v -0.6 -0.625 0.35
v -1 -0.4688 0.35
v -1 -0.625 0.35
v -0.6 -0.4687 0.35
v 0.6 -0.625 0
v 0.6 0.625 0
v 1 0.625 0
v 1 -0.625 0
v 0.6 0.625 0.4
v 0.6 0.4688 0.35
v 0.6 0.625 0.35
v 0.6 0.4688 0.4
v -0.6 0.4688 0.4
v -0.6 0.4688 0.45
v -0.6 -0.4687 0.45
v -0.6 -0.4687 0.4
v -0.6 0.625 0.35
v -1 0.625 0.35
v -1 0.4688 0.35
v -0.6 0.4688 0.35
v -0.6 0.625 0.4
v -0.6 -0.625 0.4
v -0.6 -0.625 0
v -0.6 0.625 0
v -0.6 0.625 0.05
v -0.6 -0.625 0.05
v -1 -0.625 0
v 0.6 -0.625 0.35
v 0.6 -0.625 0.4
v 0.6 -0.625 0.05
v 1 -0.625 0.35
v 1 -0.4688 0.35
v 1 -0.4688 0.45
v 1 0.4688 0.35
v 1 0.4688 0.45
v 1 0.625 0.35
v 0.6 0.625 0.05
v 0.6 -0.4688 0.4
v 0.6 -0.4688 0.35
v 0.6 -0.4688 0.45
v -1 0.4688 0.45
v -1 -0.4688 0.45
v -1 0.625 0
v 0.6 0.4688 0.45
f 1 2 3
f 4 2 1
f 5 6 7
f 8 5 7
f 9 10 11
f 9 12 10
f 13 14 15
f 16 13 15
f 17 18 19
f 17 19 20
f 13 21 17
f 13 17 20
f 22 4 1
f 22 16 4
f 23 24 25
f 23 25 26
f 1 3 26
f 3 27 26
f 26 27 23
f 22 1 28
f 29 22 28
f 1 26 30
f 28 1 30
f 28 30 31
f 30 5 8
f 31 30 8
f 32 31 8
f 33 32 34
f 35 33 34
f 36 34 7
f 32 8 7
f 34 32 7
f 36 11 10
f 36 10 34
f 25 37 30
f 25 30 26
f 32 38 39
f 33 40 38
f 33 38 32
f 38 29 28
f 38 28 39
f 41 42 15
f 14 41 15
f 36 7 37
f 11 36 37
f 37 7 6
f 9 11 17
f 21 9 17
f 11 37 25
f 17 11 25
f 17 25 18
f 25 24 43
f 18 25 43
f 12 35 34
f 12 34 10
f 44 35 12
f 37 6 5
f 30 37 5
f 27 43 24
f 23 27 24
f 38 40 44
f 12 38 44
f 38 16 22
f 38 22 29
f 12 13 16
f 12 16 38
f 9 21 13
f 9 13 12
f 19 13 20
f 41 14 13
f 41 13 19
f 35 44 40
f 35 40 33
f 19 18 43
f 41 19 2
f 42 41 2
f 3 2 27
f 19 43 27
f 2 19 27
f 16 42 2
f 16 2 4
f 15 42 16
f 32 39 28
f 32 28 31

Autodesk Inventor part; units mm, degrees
ref_plane "YZ Plane" through (0, 0, 0) normal (1, 0, 0) x (0, 1, 0)
ref_plane "XZ Plane" through (0, 0, 0) normal (0, 1, 0) x (-1, 0, 0)
ref_plane "XY Plane" through (0, 0, 0) normal (0, 0, 1) x (1, 0, 0)
sketch "Sketch1" plane through (0, 0, 0) normal (0, 0, 1) x (1, 0, 0)
  line L0 (-1, -0.625) -> (1, -0.625)
  line L1 (1, -0.625) -> (1, 0.625)
  line L2 (1, 0.625) -> (-1, 0.625)
  line L3 (-1, 0.625) -> (-1, -0.625)
  line L4 (-1, -0.625) -> (1, 0.625) construction
  line L5 (1, -0.625) -> (-1, 0.625) construction
  point P0 (0, 0)
  dimension "d0" = 2
  dimension "d1" = 1.25
extrude "Extrusion1" add sketch "Sketch1" along normal blind 0.45
sketch "Sketch2" plane through (0, 0, 0.45) normal (0, 0, 1) x (1, 0, 0)
  line L0 (-1, -0.625) -> (1, -0.625) projected
  line L1 (1, -0.625) -> (1, 0.625) projected
  line L2 (1, 0.625) -> (-1, 0.625) projected
  line L3 (-1, 0.625) -> (-1, -0.625) projected
  line L4 (-0.6, -0.625) -> (0.6, -0.625)
  line L5 (0.6, -0.625) -> (0.6, 0.625)
  line L6 (0.6, 0.625) -> (-0.6, 0.625)
  line L7 (-0.6, 0.625) -> (-0.6, -0.625)
  line L8 (-0.6, -0.625) -> (0.6, 0.625) construction
  line L9 (0.6, -0.625) -> (-0.6, 0.625) construction
  line L10 (0.6, -0.4688) -> (1, -0.4688)
  line L11 (1, -0.4688) -> (1, 0.4688)
  line L12 (1, 0.4688) -> (0.6, 0.4688)
  line L13 (0.6, 0.4688) -> (0.6, -0.4688)
  line L14 (-1, 0.625) -> (-1, -0.625) projected
  line L15 (-0.6, 0.4688) -> (-1, 0.4688)
  line L16 (-1, 0.4688) -> (-1, -0.4688)
  line L17 (-1, -0.4688) -> (-0.6, -0.4687)
  line L18 (-0.6, -0.4687) -> (-0.6, 0.4688)
  point P0 (0, 0)
  dimension "d4" = 0.4
  dimension "d5" = 0.9375
  dimension "d6" = 0.1562
  dimension "d7" = 0.9375
  dimension "d8" = 0.1562
extrude "Extrusion2" cut sketch "Sketch2" against normal blind 0.1 contours L3 L17 L7 L0 | L5 L10 L1 L0 | L3 L2 L7 L15 | L5 L2 L1 L12
sketch "Sketch3" plane through (0, 0, 0.45) normal (0, 0, 1) x (1, 0, 0)
  line L0 (-0.6, 0.625) -> (-0.6, 0.4688) projected
  line L1 (-0.6, 0.4688) -> (-1, 0.4688) projected
  line L2 (-1, 0.4688) -> (-1, -0.4688) projected
  line L3 (-1, -0.4688) -> (-0.6, -0.4687) projected
  line L4 (-0.6, -0.4687) -> (-0.6, -0.625) projected
  line L5 (-0.6, -0.625) -> (0.6, -0.625) projected
  line L6 (0.6, -0.625) -> (0.6, -0.4688) projected
  line L7 (0.6, -0.4688) -> (1, -0.4688) projected
  line L8 (1, -0.4688) -> (1, 0.4688) projected
  line L9 (1, 0.4688) -> (0.6, 0.4688) projected
  line L10 (0.6, 0.4688) -> (0.6, 0.625) projected
  line L11 (0.6, 0.625) -> (-0.6, 0.625) projected
  line L12 (0.6, 0.625) -> (-0.6, 0.625) projected
  line L13 (-0.6, -0.625) -> (0.6, -0.625)
  line L14 (0.6, -0.625) -> (0.6, 0.625)
  line L15 (0.6, 0.625) -> (-0.6, 0.625)
  line L16 (-0.6, 0.625) -> (-0.6, -0.625)
  line L17 (-0.6, -0.625) -> (0.6, 0.625) construction
  line L18 (0.6, -0.625) -> (-0.6, 0.625) construction
  point P0 (0, 0)
extrude "Extrusion3" cut sketch "Sketch3" against normal blind 0.05 contours L11 L10 L14 L6 L5 L4 L16 L0
sketch "Sketch4" plane through (0, 0, 0) normal (0, 0, -1) x (-1, 0, 0)
  line L0 (1, -0.625) -> (-1, -0.625) projected
  line L1 (1, 0.625) -> (1, -0.625) projected
  line L2 (-1, 0.625) -> (1, 0.625) projected
  line L3 (-1, -0.625) -> (-1, 0.625) projected
  line L4 (-1, 0.625) -> (1, 0.625) projected
  line L5 (-1, 0.625) -> (-0.6, 0.625)
  line L6 (-0.6, 0.625) -> (-0.6, -0.625)
  line L7 (-0.6, -0.625) -> (-1, -0.625)
  line L8 (-1, -0.625) -> (-1, 0.625)
  line L9 (1, 0.625) -> (0.6, 0.625)
  line L10 (0.6, 0.625) -> (0.6, -0.625)
  line L11 (0.6, -0.625) -> (1, -0.625)
  line L12 (1, -0.625) -> (1, 0.625)
  point P0 (0, 0)
  dimension "d13" = 0.4
  dimension "d14" = 0.4
extrude "Extrusion4" cut sketch "Sketch4" against normal blind 0.05 contours L0 L6 L2 L10
equation "\"d7\" = d5"
equation "\"d8\" = d6"
properties part number "0805" material "ABS Plastic"
